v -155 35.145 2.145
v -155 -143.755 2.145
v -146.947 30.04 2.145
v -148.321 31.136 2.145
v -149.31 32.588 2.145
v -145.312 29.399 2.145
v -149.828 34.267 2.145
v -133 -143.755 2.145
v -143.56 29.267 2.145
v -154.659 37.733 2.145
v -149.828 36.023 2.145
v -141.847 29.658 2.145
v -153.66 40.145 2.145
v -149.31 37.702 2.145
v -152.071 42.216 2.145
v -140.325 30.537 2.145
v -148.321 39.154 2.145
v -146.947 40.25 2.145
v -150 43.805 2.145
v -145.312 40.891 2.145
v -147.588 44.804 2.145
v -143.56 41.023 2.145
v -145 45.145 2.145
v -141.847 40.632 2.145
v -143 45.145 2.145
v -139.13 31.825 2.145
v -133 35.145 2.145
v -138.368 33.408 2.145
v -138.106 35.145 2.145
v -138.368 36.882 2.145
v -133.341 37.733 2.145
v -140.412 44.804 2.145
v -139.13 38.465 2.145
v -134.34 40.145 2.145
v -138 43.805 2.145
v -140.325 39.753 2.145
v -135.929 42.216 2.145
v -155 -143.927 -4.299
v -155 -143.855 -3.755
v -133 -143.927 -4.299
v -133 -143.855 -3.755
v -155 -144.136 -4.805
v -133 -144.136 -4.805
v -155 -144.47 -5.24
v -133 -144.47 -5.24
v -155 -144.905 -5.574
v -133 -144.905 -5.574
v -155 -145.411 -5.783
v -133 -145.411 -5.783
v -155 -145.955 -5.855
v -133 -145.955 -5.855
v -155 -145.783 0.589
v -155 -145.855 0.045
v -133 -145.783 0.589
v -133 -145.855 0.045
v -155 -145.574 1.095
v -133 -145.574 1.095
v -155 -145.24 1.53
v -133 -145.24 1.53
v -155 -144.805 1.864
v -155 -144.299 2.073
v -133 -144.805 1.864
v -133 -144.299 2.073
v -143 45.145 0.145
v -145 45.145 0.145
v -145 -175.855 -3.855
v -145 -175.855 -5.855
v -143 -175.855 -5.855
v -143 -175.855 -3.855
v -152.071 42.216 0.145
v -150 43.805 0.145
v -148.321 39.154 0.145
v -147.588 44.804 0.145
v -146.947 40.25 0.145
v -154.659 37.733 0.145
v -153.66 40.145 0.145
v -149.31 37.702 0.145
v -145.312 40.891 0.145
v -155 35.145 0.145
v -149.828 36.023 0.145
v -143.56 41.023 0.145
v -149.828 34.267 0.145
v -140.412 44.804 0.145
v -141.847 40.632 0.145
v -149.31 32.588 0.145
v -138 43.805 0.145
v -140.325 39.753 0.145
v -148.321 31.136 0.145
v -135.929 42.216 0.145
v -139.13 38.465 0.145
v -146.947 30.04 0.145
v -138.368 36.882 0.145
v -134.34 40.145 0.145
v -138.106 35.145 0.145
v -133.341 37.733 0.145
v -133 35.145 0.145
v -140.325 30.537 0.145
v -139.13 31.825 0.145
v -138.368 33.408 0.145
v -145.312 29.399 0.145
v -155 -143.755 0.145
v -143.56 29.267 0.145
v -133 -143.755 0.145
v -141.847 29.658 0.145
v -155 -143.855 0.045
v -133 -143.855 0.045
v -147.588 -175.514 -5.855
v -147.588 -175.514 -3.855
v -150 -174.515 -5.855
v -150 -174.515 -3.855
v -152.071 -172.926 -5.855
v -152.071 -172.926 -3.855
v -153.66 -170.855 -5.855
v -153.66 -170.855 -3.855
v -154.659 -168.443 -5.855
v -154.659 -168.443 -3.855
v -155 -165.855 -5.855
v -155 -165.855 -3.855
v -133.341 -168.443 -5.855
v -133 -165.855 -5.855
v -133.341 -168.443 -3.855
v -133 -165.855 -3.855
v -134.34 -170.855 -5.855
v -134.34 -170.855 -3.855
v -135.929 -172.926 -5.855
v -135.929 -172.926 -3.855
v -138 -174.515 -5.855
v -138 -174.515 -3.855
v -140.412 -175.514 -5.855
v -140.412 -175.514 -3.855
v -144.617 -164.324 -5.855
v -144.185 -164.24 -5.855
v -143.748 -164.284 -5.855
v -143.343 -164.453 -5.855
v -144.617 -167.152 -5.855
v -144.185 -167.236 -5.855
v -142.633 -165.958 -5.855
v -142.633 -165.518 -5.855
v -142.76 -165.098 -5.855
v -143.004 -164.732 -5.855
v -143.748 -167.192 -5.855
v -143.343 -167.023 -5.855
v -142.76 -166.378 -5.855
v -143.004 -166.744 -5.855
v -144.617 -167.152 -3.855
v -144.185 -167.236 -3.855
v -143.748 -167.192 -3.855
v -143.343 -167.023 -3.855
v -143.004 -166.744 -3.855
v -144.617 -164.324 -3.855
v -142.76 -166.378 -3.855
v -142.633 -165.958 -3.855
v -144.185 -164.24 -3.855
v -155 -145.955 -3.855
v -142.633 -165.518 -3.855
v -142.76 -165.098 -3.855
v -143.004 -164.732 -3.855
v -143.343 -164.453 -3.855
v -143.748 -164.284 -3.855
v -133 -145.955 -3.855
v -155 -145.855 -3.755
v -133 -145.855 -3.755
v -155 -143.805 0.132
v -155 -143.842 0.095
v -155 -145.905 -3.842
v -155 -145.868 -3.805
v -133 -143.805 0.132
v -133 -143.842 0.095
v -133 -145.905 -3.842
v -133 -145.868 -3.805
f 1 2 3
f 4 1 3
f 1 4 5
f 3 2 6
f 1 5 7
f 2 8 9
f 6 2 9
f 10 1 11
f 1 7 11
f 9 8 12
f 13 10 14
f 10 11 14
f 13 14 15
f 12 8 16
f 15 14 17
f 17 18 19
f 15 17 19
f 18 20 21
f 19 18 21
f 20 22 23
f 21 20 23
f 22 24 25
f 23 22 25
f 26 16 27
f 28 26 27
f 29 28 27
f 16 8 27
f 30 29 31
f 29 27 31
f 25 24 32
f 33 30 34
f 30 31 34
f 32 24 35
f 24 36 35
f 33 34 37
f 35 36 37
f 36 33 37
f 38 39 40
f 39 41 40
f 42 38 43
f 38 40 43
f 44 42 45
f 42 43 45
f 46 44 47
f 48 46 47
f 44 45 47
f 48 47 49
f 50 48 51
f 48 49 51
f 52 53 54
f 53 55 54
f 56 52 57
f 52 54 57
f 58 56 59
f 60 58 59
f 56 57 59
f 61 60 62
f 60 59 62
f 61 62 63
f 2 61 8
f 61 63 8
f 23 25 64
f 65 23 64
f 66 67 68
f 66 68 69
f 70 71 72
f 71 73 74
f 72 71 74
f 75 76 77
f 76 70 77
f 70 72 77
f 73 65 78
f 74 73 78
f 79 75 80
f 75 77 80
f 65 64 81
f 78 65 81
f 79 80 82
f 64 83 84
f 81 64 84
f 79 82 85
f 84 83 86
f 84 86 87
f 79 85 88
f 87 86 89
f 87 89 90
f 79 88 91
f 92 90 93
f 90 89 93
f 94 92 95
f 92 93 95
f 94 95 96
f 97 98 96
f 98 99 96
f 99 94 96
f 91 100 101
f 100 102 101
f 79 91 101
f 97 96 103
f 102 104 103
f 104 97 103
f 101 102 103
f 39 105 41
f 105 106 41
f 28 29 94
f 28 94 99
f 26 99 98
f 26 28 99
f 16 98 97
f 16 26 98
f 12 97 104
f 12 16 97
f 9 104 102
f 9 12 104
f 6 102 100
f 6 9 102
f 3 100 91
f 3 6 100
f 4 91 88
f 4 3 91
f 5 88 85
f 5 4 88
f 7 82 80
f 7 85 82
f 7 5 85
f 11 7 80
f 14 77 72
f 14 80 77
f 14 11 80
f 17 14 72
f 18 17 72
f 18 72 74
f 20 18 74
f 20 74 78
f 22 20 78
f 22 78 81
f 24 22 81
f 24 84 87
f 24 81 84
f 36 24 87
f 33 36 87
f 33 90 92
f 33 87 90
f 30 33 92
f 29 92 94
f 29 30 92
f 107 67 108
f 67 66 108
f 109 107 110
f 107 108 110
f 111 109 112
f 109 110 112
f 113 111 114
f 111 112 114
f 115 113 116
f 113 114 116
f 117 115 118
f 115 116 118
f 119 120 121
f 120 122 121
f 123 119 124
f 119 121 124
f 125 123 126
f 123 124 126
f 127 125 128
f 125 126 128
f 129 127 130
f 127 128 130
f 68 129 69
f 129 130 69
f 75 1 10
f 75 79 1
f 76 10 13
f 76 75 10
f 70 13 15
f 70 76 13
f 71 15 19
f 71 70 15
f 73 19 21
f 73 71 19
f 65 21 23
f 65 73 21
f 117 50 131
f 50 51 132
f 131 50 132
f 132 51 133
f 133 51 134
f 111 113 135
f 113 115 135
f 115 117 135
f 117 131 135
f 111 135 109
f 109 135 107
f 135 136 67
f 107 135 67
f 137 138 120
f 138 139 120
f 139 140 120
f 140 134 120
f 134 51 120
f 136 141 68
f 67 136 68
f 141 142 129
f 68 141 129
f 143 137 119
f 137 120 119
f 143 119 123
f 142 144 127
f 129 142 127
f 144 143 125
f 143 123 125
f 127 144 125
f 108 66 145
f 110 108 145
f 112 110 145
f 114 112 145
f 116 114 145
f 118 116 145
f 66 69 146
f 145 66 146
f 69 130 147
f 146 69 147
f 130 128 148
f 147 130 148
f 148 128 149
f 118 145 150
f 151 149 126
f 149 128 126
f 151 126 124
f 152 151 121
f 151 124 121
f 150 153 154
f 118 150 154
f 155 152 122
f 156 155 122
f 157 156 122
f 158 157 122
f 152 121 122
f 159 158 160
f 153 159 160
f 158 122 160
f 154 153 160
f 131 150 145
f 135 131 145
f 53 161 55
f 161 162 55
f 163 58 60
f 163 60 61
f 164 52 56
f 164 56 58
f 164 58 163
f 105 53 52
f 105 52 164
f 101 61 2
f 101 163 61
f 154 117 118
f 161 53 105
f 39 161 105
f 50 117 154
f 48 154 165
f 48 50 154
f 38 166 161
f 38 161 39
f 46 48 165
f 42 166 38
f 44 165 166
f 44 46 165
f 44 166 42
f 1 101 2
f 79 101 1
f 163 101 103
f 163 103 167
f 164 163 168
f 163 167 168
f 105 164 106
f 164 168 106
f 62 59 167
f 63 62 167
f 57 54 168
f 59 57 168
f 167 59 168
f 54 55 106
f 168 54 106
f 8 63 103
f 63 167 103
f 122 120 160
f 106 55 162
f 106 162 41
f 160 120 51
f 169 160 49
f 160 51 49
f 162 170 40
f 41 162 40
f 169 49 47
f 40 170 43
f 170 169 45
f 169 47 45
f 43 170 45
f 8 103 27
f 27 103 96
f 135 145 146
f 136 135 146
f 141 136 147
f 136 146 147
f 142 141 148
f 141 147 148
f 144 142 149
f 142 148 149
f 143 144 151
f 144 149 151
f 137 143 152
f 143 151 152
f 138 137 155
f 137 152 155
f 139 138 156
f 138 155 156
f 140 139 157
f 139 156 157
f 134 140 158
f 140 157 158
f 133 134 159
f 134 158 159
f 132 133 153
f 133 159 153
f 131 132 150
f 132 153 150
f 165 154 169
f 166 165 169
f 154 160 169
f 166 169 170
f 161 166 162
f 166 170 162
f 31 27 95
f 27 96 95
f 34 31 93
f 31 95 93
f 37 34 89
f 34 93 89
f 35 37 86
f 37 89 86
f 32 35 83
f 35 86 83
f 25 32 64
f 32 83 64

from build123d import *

# Parameters (mm, degrees)
BASE_FLANGE1_DEPTH      = 11
FILLET1_R               = 10
CUT_EXTRUDE1_DEPTH      = 190.414888538
CUT_EXTRUDE1_DEPTH_BACK = 190.414888538
SKETCH7_R               = 5.894184215
BODY_MOVE_COPY1_ANGLE   = 120


# Sheet-metal steps are written as plain solids
with BuildPart() as part:
    # Sketch2 → Base-Flange1 (new, symmetric)
    with BuildSketch(Plane.XY):
        with BuildLine():
            Line((-189, 0), (-0.1, 0))
            ThreePointArc((-0.1, 0), (-0.029289322, 0.029289322), (0, 0.1))
            Line((0, 0.1), (0, 3.9))
            ThreePointArc((0, 3.9), (0.61507576, 5.38492424), (2.1, 6))
            Line((2.1, 6), (32, 6))
            Line((32, 6), (32, 4))
            Line((32, 4), (2.1, 4))
            ThreePointArc((2.1, 4), (2.029289322, 3.970710678), (2, 3.9))
            Line((2, 3.9), (2, 0.1))
            ThreePointArc((2, 0.1), (1.38492424, -1.38492424), (-0.1, -2))
            Line((-0.1, -2), (-189, -2))
            Line((-189, -2), (-189, 0))
        make_face()
    extrude(amount=BASE_FLANGE1_DEPTH, both=True)

    # Fillet1
    fillet1_edges = [part.edges().sort_by_distance(p)[0] for p in [
        (-189, -1, -11),
        (32, 5, -11),
        (-189, -1, 11),
        (32, 5, 11),
    ]]
    fillet(fillet1_edges, radius=FILLET1_R)

    # Sketch7 → Cut-Extrude1 (cut, two sides: drawn at the far end of the back side and taken through both)
    with BuildSketch(Plane(origin=(0, 0, 0), x_dir=(1, 0, 0), z_dir=(0, 1, 0)).offset(-CUT_EXTRUDE1_DEPTH_BACK)):
        with Locations(Location((-179, 0, 0), (0, 0, 270))):
            Circle(SKETCH7_R)
        with BuildLine():
            Line((20.46881318, 0.616566496), (23.297240305, 0.616566496))
            ThreePointArc((23.297240305, 0.616566496), (21.883026743, -1.383433504), (20.46881318, 0.616566496))
        make_face()
    extrude(amount=CUT_EXTRUDE1_DEPTH + CUT_EXTRUDE1_DEPTH_BACK, mode=Mode.SUBTRACT)


with BuildPart() as part_1:
    # Body-Move/Copy1: moved
    add(part.part.moved(Location((0, 0, 0))).rotate(Axis((-95.951666667, -47.903333333, 48.048333333), (-0.5773502691898587, 0.5773502691889744, -0.5773502691900443)), BODY_MOVE_COPY1_ANGLE))


solid = part_1.part
